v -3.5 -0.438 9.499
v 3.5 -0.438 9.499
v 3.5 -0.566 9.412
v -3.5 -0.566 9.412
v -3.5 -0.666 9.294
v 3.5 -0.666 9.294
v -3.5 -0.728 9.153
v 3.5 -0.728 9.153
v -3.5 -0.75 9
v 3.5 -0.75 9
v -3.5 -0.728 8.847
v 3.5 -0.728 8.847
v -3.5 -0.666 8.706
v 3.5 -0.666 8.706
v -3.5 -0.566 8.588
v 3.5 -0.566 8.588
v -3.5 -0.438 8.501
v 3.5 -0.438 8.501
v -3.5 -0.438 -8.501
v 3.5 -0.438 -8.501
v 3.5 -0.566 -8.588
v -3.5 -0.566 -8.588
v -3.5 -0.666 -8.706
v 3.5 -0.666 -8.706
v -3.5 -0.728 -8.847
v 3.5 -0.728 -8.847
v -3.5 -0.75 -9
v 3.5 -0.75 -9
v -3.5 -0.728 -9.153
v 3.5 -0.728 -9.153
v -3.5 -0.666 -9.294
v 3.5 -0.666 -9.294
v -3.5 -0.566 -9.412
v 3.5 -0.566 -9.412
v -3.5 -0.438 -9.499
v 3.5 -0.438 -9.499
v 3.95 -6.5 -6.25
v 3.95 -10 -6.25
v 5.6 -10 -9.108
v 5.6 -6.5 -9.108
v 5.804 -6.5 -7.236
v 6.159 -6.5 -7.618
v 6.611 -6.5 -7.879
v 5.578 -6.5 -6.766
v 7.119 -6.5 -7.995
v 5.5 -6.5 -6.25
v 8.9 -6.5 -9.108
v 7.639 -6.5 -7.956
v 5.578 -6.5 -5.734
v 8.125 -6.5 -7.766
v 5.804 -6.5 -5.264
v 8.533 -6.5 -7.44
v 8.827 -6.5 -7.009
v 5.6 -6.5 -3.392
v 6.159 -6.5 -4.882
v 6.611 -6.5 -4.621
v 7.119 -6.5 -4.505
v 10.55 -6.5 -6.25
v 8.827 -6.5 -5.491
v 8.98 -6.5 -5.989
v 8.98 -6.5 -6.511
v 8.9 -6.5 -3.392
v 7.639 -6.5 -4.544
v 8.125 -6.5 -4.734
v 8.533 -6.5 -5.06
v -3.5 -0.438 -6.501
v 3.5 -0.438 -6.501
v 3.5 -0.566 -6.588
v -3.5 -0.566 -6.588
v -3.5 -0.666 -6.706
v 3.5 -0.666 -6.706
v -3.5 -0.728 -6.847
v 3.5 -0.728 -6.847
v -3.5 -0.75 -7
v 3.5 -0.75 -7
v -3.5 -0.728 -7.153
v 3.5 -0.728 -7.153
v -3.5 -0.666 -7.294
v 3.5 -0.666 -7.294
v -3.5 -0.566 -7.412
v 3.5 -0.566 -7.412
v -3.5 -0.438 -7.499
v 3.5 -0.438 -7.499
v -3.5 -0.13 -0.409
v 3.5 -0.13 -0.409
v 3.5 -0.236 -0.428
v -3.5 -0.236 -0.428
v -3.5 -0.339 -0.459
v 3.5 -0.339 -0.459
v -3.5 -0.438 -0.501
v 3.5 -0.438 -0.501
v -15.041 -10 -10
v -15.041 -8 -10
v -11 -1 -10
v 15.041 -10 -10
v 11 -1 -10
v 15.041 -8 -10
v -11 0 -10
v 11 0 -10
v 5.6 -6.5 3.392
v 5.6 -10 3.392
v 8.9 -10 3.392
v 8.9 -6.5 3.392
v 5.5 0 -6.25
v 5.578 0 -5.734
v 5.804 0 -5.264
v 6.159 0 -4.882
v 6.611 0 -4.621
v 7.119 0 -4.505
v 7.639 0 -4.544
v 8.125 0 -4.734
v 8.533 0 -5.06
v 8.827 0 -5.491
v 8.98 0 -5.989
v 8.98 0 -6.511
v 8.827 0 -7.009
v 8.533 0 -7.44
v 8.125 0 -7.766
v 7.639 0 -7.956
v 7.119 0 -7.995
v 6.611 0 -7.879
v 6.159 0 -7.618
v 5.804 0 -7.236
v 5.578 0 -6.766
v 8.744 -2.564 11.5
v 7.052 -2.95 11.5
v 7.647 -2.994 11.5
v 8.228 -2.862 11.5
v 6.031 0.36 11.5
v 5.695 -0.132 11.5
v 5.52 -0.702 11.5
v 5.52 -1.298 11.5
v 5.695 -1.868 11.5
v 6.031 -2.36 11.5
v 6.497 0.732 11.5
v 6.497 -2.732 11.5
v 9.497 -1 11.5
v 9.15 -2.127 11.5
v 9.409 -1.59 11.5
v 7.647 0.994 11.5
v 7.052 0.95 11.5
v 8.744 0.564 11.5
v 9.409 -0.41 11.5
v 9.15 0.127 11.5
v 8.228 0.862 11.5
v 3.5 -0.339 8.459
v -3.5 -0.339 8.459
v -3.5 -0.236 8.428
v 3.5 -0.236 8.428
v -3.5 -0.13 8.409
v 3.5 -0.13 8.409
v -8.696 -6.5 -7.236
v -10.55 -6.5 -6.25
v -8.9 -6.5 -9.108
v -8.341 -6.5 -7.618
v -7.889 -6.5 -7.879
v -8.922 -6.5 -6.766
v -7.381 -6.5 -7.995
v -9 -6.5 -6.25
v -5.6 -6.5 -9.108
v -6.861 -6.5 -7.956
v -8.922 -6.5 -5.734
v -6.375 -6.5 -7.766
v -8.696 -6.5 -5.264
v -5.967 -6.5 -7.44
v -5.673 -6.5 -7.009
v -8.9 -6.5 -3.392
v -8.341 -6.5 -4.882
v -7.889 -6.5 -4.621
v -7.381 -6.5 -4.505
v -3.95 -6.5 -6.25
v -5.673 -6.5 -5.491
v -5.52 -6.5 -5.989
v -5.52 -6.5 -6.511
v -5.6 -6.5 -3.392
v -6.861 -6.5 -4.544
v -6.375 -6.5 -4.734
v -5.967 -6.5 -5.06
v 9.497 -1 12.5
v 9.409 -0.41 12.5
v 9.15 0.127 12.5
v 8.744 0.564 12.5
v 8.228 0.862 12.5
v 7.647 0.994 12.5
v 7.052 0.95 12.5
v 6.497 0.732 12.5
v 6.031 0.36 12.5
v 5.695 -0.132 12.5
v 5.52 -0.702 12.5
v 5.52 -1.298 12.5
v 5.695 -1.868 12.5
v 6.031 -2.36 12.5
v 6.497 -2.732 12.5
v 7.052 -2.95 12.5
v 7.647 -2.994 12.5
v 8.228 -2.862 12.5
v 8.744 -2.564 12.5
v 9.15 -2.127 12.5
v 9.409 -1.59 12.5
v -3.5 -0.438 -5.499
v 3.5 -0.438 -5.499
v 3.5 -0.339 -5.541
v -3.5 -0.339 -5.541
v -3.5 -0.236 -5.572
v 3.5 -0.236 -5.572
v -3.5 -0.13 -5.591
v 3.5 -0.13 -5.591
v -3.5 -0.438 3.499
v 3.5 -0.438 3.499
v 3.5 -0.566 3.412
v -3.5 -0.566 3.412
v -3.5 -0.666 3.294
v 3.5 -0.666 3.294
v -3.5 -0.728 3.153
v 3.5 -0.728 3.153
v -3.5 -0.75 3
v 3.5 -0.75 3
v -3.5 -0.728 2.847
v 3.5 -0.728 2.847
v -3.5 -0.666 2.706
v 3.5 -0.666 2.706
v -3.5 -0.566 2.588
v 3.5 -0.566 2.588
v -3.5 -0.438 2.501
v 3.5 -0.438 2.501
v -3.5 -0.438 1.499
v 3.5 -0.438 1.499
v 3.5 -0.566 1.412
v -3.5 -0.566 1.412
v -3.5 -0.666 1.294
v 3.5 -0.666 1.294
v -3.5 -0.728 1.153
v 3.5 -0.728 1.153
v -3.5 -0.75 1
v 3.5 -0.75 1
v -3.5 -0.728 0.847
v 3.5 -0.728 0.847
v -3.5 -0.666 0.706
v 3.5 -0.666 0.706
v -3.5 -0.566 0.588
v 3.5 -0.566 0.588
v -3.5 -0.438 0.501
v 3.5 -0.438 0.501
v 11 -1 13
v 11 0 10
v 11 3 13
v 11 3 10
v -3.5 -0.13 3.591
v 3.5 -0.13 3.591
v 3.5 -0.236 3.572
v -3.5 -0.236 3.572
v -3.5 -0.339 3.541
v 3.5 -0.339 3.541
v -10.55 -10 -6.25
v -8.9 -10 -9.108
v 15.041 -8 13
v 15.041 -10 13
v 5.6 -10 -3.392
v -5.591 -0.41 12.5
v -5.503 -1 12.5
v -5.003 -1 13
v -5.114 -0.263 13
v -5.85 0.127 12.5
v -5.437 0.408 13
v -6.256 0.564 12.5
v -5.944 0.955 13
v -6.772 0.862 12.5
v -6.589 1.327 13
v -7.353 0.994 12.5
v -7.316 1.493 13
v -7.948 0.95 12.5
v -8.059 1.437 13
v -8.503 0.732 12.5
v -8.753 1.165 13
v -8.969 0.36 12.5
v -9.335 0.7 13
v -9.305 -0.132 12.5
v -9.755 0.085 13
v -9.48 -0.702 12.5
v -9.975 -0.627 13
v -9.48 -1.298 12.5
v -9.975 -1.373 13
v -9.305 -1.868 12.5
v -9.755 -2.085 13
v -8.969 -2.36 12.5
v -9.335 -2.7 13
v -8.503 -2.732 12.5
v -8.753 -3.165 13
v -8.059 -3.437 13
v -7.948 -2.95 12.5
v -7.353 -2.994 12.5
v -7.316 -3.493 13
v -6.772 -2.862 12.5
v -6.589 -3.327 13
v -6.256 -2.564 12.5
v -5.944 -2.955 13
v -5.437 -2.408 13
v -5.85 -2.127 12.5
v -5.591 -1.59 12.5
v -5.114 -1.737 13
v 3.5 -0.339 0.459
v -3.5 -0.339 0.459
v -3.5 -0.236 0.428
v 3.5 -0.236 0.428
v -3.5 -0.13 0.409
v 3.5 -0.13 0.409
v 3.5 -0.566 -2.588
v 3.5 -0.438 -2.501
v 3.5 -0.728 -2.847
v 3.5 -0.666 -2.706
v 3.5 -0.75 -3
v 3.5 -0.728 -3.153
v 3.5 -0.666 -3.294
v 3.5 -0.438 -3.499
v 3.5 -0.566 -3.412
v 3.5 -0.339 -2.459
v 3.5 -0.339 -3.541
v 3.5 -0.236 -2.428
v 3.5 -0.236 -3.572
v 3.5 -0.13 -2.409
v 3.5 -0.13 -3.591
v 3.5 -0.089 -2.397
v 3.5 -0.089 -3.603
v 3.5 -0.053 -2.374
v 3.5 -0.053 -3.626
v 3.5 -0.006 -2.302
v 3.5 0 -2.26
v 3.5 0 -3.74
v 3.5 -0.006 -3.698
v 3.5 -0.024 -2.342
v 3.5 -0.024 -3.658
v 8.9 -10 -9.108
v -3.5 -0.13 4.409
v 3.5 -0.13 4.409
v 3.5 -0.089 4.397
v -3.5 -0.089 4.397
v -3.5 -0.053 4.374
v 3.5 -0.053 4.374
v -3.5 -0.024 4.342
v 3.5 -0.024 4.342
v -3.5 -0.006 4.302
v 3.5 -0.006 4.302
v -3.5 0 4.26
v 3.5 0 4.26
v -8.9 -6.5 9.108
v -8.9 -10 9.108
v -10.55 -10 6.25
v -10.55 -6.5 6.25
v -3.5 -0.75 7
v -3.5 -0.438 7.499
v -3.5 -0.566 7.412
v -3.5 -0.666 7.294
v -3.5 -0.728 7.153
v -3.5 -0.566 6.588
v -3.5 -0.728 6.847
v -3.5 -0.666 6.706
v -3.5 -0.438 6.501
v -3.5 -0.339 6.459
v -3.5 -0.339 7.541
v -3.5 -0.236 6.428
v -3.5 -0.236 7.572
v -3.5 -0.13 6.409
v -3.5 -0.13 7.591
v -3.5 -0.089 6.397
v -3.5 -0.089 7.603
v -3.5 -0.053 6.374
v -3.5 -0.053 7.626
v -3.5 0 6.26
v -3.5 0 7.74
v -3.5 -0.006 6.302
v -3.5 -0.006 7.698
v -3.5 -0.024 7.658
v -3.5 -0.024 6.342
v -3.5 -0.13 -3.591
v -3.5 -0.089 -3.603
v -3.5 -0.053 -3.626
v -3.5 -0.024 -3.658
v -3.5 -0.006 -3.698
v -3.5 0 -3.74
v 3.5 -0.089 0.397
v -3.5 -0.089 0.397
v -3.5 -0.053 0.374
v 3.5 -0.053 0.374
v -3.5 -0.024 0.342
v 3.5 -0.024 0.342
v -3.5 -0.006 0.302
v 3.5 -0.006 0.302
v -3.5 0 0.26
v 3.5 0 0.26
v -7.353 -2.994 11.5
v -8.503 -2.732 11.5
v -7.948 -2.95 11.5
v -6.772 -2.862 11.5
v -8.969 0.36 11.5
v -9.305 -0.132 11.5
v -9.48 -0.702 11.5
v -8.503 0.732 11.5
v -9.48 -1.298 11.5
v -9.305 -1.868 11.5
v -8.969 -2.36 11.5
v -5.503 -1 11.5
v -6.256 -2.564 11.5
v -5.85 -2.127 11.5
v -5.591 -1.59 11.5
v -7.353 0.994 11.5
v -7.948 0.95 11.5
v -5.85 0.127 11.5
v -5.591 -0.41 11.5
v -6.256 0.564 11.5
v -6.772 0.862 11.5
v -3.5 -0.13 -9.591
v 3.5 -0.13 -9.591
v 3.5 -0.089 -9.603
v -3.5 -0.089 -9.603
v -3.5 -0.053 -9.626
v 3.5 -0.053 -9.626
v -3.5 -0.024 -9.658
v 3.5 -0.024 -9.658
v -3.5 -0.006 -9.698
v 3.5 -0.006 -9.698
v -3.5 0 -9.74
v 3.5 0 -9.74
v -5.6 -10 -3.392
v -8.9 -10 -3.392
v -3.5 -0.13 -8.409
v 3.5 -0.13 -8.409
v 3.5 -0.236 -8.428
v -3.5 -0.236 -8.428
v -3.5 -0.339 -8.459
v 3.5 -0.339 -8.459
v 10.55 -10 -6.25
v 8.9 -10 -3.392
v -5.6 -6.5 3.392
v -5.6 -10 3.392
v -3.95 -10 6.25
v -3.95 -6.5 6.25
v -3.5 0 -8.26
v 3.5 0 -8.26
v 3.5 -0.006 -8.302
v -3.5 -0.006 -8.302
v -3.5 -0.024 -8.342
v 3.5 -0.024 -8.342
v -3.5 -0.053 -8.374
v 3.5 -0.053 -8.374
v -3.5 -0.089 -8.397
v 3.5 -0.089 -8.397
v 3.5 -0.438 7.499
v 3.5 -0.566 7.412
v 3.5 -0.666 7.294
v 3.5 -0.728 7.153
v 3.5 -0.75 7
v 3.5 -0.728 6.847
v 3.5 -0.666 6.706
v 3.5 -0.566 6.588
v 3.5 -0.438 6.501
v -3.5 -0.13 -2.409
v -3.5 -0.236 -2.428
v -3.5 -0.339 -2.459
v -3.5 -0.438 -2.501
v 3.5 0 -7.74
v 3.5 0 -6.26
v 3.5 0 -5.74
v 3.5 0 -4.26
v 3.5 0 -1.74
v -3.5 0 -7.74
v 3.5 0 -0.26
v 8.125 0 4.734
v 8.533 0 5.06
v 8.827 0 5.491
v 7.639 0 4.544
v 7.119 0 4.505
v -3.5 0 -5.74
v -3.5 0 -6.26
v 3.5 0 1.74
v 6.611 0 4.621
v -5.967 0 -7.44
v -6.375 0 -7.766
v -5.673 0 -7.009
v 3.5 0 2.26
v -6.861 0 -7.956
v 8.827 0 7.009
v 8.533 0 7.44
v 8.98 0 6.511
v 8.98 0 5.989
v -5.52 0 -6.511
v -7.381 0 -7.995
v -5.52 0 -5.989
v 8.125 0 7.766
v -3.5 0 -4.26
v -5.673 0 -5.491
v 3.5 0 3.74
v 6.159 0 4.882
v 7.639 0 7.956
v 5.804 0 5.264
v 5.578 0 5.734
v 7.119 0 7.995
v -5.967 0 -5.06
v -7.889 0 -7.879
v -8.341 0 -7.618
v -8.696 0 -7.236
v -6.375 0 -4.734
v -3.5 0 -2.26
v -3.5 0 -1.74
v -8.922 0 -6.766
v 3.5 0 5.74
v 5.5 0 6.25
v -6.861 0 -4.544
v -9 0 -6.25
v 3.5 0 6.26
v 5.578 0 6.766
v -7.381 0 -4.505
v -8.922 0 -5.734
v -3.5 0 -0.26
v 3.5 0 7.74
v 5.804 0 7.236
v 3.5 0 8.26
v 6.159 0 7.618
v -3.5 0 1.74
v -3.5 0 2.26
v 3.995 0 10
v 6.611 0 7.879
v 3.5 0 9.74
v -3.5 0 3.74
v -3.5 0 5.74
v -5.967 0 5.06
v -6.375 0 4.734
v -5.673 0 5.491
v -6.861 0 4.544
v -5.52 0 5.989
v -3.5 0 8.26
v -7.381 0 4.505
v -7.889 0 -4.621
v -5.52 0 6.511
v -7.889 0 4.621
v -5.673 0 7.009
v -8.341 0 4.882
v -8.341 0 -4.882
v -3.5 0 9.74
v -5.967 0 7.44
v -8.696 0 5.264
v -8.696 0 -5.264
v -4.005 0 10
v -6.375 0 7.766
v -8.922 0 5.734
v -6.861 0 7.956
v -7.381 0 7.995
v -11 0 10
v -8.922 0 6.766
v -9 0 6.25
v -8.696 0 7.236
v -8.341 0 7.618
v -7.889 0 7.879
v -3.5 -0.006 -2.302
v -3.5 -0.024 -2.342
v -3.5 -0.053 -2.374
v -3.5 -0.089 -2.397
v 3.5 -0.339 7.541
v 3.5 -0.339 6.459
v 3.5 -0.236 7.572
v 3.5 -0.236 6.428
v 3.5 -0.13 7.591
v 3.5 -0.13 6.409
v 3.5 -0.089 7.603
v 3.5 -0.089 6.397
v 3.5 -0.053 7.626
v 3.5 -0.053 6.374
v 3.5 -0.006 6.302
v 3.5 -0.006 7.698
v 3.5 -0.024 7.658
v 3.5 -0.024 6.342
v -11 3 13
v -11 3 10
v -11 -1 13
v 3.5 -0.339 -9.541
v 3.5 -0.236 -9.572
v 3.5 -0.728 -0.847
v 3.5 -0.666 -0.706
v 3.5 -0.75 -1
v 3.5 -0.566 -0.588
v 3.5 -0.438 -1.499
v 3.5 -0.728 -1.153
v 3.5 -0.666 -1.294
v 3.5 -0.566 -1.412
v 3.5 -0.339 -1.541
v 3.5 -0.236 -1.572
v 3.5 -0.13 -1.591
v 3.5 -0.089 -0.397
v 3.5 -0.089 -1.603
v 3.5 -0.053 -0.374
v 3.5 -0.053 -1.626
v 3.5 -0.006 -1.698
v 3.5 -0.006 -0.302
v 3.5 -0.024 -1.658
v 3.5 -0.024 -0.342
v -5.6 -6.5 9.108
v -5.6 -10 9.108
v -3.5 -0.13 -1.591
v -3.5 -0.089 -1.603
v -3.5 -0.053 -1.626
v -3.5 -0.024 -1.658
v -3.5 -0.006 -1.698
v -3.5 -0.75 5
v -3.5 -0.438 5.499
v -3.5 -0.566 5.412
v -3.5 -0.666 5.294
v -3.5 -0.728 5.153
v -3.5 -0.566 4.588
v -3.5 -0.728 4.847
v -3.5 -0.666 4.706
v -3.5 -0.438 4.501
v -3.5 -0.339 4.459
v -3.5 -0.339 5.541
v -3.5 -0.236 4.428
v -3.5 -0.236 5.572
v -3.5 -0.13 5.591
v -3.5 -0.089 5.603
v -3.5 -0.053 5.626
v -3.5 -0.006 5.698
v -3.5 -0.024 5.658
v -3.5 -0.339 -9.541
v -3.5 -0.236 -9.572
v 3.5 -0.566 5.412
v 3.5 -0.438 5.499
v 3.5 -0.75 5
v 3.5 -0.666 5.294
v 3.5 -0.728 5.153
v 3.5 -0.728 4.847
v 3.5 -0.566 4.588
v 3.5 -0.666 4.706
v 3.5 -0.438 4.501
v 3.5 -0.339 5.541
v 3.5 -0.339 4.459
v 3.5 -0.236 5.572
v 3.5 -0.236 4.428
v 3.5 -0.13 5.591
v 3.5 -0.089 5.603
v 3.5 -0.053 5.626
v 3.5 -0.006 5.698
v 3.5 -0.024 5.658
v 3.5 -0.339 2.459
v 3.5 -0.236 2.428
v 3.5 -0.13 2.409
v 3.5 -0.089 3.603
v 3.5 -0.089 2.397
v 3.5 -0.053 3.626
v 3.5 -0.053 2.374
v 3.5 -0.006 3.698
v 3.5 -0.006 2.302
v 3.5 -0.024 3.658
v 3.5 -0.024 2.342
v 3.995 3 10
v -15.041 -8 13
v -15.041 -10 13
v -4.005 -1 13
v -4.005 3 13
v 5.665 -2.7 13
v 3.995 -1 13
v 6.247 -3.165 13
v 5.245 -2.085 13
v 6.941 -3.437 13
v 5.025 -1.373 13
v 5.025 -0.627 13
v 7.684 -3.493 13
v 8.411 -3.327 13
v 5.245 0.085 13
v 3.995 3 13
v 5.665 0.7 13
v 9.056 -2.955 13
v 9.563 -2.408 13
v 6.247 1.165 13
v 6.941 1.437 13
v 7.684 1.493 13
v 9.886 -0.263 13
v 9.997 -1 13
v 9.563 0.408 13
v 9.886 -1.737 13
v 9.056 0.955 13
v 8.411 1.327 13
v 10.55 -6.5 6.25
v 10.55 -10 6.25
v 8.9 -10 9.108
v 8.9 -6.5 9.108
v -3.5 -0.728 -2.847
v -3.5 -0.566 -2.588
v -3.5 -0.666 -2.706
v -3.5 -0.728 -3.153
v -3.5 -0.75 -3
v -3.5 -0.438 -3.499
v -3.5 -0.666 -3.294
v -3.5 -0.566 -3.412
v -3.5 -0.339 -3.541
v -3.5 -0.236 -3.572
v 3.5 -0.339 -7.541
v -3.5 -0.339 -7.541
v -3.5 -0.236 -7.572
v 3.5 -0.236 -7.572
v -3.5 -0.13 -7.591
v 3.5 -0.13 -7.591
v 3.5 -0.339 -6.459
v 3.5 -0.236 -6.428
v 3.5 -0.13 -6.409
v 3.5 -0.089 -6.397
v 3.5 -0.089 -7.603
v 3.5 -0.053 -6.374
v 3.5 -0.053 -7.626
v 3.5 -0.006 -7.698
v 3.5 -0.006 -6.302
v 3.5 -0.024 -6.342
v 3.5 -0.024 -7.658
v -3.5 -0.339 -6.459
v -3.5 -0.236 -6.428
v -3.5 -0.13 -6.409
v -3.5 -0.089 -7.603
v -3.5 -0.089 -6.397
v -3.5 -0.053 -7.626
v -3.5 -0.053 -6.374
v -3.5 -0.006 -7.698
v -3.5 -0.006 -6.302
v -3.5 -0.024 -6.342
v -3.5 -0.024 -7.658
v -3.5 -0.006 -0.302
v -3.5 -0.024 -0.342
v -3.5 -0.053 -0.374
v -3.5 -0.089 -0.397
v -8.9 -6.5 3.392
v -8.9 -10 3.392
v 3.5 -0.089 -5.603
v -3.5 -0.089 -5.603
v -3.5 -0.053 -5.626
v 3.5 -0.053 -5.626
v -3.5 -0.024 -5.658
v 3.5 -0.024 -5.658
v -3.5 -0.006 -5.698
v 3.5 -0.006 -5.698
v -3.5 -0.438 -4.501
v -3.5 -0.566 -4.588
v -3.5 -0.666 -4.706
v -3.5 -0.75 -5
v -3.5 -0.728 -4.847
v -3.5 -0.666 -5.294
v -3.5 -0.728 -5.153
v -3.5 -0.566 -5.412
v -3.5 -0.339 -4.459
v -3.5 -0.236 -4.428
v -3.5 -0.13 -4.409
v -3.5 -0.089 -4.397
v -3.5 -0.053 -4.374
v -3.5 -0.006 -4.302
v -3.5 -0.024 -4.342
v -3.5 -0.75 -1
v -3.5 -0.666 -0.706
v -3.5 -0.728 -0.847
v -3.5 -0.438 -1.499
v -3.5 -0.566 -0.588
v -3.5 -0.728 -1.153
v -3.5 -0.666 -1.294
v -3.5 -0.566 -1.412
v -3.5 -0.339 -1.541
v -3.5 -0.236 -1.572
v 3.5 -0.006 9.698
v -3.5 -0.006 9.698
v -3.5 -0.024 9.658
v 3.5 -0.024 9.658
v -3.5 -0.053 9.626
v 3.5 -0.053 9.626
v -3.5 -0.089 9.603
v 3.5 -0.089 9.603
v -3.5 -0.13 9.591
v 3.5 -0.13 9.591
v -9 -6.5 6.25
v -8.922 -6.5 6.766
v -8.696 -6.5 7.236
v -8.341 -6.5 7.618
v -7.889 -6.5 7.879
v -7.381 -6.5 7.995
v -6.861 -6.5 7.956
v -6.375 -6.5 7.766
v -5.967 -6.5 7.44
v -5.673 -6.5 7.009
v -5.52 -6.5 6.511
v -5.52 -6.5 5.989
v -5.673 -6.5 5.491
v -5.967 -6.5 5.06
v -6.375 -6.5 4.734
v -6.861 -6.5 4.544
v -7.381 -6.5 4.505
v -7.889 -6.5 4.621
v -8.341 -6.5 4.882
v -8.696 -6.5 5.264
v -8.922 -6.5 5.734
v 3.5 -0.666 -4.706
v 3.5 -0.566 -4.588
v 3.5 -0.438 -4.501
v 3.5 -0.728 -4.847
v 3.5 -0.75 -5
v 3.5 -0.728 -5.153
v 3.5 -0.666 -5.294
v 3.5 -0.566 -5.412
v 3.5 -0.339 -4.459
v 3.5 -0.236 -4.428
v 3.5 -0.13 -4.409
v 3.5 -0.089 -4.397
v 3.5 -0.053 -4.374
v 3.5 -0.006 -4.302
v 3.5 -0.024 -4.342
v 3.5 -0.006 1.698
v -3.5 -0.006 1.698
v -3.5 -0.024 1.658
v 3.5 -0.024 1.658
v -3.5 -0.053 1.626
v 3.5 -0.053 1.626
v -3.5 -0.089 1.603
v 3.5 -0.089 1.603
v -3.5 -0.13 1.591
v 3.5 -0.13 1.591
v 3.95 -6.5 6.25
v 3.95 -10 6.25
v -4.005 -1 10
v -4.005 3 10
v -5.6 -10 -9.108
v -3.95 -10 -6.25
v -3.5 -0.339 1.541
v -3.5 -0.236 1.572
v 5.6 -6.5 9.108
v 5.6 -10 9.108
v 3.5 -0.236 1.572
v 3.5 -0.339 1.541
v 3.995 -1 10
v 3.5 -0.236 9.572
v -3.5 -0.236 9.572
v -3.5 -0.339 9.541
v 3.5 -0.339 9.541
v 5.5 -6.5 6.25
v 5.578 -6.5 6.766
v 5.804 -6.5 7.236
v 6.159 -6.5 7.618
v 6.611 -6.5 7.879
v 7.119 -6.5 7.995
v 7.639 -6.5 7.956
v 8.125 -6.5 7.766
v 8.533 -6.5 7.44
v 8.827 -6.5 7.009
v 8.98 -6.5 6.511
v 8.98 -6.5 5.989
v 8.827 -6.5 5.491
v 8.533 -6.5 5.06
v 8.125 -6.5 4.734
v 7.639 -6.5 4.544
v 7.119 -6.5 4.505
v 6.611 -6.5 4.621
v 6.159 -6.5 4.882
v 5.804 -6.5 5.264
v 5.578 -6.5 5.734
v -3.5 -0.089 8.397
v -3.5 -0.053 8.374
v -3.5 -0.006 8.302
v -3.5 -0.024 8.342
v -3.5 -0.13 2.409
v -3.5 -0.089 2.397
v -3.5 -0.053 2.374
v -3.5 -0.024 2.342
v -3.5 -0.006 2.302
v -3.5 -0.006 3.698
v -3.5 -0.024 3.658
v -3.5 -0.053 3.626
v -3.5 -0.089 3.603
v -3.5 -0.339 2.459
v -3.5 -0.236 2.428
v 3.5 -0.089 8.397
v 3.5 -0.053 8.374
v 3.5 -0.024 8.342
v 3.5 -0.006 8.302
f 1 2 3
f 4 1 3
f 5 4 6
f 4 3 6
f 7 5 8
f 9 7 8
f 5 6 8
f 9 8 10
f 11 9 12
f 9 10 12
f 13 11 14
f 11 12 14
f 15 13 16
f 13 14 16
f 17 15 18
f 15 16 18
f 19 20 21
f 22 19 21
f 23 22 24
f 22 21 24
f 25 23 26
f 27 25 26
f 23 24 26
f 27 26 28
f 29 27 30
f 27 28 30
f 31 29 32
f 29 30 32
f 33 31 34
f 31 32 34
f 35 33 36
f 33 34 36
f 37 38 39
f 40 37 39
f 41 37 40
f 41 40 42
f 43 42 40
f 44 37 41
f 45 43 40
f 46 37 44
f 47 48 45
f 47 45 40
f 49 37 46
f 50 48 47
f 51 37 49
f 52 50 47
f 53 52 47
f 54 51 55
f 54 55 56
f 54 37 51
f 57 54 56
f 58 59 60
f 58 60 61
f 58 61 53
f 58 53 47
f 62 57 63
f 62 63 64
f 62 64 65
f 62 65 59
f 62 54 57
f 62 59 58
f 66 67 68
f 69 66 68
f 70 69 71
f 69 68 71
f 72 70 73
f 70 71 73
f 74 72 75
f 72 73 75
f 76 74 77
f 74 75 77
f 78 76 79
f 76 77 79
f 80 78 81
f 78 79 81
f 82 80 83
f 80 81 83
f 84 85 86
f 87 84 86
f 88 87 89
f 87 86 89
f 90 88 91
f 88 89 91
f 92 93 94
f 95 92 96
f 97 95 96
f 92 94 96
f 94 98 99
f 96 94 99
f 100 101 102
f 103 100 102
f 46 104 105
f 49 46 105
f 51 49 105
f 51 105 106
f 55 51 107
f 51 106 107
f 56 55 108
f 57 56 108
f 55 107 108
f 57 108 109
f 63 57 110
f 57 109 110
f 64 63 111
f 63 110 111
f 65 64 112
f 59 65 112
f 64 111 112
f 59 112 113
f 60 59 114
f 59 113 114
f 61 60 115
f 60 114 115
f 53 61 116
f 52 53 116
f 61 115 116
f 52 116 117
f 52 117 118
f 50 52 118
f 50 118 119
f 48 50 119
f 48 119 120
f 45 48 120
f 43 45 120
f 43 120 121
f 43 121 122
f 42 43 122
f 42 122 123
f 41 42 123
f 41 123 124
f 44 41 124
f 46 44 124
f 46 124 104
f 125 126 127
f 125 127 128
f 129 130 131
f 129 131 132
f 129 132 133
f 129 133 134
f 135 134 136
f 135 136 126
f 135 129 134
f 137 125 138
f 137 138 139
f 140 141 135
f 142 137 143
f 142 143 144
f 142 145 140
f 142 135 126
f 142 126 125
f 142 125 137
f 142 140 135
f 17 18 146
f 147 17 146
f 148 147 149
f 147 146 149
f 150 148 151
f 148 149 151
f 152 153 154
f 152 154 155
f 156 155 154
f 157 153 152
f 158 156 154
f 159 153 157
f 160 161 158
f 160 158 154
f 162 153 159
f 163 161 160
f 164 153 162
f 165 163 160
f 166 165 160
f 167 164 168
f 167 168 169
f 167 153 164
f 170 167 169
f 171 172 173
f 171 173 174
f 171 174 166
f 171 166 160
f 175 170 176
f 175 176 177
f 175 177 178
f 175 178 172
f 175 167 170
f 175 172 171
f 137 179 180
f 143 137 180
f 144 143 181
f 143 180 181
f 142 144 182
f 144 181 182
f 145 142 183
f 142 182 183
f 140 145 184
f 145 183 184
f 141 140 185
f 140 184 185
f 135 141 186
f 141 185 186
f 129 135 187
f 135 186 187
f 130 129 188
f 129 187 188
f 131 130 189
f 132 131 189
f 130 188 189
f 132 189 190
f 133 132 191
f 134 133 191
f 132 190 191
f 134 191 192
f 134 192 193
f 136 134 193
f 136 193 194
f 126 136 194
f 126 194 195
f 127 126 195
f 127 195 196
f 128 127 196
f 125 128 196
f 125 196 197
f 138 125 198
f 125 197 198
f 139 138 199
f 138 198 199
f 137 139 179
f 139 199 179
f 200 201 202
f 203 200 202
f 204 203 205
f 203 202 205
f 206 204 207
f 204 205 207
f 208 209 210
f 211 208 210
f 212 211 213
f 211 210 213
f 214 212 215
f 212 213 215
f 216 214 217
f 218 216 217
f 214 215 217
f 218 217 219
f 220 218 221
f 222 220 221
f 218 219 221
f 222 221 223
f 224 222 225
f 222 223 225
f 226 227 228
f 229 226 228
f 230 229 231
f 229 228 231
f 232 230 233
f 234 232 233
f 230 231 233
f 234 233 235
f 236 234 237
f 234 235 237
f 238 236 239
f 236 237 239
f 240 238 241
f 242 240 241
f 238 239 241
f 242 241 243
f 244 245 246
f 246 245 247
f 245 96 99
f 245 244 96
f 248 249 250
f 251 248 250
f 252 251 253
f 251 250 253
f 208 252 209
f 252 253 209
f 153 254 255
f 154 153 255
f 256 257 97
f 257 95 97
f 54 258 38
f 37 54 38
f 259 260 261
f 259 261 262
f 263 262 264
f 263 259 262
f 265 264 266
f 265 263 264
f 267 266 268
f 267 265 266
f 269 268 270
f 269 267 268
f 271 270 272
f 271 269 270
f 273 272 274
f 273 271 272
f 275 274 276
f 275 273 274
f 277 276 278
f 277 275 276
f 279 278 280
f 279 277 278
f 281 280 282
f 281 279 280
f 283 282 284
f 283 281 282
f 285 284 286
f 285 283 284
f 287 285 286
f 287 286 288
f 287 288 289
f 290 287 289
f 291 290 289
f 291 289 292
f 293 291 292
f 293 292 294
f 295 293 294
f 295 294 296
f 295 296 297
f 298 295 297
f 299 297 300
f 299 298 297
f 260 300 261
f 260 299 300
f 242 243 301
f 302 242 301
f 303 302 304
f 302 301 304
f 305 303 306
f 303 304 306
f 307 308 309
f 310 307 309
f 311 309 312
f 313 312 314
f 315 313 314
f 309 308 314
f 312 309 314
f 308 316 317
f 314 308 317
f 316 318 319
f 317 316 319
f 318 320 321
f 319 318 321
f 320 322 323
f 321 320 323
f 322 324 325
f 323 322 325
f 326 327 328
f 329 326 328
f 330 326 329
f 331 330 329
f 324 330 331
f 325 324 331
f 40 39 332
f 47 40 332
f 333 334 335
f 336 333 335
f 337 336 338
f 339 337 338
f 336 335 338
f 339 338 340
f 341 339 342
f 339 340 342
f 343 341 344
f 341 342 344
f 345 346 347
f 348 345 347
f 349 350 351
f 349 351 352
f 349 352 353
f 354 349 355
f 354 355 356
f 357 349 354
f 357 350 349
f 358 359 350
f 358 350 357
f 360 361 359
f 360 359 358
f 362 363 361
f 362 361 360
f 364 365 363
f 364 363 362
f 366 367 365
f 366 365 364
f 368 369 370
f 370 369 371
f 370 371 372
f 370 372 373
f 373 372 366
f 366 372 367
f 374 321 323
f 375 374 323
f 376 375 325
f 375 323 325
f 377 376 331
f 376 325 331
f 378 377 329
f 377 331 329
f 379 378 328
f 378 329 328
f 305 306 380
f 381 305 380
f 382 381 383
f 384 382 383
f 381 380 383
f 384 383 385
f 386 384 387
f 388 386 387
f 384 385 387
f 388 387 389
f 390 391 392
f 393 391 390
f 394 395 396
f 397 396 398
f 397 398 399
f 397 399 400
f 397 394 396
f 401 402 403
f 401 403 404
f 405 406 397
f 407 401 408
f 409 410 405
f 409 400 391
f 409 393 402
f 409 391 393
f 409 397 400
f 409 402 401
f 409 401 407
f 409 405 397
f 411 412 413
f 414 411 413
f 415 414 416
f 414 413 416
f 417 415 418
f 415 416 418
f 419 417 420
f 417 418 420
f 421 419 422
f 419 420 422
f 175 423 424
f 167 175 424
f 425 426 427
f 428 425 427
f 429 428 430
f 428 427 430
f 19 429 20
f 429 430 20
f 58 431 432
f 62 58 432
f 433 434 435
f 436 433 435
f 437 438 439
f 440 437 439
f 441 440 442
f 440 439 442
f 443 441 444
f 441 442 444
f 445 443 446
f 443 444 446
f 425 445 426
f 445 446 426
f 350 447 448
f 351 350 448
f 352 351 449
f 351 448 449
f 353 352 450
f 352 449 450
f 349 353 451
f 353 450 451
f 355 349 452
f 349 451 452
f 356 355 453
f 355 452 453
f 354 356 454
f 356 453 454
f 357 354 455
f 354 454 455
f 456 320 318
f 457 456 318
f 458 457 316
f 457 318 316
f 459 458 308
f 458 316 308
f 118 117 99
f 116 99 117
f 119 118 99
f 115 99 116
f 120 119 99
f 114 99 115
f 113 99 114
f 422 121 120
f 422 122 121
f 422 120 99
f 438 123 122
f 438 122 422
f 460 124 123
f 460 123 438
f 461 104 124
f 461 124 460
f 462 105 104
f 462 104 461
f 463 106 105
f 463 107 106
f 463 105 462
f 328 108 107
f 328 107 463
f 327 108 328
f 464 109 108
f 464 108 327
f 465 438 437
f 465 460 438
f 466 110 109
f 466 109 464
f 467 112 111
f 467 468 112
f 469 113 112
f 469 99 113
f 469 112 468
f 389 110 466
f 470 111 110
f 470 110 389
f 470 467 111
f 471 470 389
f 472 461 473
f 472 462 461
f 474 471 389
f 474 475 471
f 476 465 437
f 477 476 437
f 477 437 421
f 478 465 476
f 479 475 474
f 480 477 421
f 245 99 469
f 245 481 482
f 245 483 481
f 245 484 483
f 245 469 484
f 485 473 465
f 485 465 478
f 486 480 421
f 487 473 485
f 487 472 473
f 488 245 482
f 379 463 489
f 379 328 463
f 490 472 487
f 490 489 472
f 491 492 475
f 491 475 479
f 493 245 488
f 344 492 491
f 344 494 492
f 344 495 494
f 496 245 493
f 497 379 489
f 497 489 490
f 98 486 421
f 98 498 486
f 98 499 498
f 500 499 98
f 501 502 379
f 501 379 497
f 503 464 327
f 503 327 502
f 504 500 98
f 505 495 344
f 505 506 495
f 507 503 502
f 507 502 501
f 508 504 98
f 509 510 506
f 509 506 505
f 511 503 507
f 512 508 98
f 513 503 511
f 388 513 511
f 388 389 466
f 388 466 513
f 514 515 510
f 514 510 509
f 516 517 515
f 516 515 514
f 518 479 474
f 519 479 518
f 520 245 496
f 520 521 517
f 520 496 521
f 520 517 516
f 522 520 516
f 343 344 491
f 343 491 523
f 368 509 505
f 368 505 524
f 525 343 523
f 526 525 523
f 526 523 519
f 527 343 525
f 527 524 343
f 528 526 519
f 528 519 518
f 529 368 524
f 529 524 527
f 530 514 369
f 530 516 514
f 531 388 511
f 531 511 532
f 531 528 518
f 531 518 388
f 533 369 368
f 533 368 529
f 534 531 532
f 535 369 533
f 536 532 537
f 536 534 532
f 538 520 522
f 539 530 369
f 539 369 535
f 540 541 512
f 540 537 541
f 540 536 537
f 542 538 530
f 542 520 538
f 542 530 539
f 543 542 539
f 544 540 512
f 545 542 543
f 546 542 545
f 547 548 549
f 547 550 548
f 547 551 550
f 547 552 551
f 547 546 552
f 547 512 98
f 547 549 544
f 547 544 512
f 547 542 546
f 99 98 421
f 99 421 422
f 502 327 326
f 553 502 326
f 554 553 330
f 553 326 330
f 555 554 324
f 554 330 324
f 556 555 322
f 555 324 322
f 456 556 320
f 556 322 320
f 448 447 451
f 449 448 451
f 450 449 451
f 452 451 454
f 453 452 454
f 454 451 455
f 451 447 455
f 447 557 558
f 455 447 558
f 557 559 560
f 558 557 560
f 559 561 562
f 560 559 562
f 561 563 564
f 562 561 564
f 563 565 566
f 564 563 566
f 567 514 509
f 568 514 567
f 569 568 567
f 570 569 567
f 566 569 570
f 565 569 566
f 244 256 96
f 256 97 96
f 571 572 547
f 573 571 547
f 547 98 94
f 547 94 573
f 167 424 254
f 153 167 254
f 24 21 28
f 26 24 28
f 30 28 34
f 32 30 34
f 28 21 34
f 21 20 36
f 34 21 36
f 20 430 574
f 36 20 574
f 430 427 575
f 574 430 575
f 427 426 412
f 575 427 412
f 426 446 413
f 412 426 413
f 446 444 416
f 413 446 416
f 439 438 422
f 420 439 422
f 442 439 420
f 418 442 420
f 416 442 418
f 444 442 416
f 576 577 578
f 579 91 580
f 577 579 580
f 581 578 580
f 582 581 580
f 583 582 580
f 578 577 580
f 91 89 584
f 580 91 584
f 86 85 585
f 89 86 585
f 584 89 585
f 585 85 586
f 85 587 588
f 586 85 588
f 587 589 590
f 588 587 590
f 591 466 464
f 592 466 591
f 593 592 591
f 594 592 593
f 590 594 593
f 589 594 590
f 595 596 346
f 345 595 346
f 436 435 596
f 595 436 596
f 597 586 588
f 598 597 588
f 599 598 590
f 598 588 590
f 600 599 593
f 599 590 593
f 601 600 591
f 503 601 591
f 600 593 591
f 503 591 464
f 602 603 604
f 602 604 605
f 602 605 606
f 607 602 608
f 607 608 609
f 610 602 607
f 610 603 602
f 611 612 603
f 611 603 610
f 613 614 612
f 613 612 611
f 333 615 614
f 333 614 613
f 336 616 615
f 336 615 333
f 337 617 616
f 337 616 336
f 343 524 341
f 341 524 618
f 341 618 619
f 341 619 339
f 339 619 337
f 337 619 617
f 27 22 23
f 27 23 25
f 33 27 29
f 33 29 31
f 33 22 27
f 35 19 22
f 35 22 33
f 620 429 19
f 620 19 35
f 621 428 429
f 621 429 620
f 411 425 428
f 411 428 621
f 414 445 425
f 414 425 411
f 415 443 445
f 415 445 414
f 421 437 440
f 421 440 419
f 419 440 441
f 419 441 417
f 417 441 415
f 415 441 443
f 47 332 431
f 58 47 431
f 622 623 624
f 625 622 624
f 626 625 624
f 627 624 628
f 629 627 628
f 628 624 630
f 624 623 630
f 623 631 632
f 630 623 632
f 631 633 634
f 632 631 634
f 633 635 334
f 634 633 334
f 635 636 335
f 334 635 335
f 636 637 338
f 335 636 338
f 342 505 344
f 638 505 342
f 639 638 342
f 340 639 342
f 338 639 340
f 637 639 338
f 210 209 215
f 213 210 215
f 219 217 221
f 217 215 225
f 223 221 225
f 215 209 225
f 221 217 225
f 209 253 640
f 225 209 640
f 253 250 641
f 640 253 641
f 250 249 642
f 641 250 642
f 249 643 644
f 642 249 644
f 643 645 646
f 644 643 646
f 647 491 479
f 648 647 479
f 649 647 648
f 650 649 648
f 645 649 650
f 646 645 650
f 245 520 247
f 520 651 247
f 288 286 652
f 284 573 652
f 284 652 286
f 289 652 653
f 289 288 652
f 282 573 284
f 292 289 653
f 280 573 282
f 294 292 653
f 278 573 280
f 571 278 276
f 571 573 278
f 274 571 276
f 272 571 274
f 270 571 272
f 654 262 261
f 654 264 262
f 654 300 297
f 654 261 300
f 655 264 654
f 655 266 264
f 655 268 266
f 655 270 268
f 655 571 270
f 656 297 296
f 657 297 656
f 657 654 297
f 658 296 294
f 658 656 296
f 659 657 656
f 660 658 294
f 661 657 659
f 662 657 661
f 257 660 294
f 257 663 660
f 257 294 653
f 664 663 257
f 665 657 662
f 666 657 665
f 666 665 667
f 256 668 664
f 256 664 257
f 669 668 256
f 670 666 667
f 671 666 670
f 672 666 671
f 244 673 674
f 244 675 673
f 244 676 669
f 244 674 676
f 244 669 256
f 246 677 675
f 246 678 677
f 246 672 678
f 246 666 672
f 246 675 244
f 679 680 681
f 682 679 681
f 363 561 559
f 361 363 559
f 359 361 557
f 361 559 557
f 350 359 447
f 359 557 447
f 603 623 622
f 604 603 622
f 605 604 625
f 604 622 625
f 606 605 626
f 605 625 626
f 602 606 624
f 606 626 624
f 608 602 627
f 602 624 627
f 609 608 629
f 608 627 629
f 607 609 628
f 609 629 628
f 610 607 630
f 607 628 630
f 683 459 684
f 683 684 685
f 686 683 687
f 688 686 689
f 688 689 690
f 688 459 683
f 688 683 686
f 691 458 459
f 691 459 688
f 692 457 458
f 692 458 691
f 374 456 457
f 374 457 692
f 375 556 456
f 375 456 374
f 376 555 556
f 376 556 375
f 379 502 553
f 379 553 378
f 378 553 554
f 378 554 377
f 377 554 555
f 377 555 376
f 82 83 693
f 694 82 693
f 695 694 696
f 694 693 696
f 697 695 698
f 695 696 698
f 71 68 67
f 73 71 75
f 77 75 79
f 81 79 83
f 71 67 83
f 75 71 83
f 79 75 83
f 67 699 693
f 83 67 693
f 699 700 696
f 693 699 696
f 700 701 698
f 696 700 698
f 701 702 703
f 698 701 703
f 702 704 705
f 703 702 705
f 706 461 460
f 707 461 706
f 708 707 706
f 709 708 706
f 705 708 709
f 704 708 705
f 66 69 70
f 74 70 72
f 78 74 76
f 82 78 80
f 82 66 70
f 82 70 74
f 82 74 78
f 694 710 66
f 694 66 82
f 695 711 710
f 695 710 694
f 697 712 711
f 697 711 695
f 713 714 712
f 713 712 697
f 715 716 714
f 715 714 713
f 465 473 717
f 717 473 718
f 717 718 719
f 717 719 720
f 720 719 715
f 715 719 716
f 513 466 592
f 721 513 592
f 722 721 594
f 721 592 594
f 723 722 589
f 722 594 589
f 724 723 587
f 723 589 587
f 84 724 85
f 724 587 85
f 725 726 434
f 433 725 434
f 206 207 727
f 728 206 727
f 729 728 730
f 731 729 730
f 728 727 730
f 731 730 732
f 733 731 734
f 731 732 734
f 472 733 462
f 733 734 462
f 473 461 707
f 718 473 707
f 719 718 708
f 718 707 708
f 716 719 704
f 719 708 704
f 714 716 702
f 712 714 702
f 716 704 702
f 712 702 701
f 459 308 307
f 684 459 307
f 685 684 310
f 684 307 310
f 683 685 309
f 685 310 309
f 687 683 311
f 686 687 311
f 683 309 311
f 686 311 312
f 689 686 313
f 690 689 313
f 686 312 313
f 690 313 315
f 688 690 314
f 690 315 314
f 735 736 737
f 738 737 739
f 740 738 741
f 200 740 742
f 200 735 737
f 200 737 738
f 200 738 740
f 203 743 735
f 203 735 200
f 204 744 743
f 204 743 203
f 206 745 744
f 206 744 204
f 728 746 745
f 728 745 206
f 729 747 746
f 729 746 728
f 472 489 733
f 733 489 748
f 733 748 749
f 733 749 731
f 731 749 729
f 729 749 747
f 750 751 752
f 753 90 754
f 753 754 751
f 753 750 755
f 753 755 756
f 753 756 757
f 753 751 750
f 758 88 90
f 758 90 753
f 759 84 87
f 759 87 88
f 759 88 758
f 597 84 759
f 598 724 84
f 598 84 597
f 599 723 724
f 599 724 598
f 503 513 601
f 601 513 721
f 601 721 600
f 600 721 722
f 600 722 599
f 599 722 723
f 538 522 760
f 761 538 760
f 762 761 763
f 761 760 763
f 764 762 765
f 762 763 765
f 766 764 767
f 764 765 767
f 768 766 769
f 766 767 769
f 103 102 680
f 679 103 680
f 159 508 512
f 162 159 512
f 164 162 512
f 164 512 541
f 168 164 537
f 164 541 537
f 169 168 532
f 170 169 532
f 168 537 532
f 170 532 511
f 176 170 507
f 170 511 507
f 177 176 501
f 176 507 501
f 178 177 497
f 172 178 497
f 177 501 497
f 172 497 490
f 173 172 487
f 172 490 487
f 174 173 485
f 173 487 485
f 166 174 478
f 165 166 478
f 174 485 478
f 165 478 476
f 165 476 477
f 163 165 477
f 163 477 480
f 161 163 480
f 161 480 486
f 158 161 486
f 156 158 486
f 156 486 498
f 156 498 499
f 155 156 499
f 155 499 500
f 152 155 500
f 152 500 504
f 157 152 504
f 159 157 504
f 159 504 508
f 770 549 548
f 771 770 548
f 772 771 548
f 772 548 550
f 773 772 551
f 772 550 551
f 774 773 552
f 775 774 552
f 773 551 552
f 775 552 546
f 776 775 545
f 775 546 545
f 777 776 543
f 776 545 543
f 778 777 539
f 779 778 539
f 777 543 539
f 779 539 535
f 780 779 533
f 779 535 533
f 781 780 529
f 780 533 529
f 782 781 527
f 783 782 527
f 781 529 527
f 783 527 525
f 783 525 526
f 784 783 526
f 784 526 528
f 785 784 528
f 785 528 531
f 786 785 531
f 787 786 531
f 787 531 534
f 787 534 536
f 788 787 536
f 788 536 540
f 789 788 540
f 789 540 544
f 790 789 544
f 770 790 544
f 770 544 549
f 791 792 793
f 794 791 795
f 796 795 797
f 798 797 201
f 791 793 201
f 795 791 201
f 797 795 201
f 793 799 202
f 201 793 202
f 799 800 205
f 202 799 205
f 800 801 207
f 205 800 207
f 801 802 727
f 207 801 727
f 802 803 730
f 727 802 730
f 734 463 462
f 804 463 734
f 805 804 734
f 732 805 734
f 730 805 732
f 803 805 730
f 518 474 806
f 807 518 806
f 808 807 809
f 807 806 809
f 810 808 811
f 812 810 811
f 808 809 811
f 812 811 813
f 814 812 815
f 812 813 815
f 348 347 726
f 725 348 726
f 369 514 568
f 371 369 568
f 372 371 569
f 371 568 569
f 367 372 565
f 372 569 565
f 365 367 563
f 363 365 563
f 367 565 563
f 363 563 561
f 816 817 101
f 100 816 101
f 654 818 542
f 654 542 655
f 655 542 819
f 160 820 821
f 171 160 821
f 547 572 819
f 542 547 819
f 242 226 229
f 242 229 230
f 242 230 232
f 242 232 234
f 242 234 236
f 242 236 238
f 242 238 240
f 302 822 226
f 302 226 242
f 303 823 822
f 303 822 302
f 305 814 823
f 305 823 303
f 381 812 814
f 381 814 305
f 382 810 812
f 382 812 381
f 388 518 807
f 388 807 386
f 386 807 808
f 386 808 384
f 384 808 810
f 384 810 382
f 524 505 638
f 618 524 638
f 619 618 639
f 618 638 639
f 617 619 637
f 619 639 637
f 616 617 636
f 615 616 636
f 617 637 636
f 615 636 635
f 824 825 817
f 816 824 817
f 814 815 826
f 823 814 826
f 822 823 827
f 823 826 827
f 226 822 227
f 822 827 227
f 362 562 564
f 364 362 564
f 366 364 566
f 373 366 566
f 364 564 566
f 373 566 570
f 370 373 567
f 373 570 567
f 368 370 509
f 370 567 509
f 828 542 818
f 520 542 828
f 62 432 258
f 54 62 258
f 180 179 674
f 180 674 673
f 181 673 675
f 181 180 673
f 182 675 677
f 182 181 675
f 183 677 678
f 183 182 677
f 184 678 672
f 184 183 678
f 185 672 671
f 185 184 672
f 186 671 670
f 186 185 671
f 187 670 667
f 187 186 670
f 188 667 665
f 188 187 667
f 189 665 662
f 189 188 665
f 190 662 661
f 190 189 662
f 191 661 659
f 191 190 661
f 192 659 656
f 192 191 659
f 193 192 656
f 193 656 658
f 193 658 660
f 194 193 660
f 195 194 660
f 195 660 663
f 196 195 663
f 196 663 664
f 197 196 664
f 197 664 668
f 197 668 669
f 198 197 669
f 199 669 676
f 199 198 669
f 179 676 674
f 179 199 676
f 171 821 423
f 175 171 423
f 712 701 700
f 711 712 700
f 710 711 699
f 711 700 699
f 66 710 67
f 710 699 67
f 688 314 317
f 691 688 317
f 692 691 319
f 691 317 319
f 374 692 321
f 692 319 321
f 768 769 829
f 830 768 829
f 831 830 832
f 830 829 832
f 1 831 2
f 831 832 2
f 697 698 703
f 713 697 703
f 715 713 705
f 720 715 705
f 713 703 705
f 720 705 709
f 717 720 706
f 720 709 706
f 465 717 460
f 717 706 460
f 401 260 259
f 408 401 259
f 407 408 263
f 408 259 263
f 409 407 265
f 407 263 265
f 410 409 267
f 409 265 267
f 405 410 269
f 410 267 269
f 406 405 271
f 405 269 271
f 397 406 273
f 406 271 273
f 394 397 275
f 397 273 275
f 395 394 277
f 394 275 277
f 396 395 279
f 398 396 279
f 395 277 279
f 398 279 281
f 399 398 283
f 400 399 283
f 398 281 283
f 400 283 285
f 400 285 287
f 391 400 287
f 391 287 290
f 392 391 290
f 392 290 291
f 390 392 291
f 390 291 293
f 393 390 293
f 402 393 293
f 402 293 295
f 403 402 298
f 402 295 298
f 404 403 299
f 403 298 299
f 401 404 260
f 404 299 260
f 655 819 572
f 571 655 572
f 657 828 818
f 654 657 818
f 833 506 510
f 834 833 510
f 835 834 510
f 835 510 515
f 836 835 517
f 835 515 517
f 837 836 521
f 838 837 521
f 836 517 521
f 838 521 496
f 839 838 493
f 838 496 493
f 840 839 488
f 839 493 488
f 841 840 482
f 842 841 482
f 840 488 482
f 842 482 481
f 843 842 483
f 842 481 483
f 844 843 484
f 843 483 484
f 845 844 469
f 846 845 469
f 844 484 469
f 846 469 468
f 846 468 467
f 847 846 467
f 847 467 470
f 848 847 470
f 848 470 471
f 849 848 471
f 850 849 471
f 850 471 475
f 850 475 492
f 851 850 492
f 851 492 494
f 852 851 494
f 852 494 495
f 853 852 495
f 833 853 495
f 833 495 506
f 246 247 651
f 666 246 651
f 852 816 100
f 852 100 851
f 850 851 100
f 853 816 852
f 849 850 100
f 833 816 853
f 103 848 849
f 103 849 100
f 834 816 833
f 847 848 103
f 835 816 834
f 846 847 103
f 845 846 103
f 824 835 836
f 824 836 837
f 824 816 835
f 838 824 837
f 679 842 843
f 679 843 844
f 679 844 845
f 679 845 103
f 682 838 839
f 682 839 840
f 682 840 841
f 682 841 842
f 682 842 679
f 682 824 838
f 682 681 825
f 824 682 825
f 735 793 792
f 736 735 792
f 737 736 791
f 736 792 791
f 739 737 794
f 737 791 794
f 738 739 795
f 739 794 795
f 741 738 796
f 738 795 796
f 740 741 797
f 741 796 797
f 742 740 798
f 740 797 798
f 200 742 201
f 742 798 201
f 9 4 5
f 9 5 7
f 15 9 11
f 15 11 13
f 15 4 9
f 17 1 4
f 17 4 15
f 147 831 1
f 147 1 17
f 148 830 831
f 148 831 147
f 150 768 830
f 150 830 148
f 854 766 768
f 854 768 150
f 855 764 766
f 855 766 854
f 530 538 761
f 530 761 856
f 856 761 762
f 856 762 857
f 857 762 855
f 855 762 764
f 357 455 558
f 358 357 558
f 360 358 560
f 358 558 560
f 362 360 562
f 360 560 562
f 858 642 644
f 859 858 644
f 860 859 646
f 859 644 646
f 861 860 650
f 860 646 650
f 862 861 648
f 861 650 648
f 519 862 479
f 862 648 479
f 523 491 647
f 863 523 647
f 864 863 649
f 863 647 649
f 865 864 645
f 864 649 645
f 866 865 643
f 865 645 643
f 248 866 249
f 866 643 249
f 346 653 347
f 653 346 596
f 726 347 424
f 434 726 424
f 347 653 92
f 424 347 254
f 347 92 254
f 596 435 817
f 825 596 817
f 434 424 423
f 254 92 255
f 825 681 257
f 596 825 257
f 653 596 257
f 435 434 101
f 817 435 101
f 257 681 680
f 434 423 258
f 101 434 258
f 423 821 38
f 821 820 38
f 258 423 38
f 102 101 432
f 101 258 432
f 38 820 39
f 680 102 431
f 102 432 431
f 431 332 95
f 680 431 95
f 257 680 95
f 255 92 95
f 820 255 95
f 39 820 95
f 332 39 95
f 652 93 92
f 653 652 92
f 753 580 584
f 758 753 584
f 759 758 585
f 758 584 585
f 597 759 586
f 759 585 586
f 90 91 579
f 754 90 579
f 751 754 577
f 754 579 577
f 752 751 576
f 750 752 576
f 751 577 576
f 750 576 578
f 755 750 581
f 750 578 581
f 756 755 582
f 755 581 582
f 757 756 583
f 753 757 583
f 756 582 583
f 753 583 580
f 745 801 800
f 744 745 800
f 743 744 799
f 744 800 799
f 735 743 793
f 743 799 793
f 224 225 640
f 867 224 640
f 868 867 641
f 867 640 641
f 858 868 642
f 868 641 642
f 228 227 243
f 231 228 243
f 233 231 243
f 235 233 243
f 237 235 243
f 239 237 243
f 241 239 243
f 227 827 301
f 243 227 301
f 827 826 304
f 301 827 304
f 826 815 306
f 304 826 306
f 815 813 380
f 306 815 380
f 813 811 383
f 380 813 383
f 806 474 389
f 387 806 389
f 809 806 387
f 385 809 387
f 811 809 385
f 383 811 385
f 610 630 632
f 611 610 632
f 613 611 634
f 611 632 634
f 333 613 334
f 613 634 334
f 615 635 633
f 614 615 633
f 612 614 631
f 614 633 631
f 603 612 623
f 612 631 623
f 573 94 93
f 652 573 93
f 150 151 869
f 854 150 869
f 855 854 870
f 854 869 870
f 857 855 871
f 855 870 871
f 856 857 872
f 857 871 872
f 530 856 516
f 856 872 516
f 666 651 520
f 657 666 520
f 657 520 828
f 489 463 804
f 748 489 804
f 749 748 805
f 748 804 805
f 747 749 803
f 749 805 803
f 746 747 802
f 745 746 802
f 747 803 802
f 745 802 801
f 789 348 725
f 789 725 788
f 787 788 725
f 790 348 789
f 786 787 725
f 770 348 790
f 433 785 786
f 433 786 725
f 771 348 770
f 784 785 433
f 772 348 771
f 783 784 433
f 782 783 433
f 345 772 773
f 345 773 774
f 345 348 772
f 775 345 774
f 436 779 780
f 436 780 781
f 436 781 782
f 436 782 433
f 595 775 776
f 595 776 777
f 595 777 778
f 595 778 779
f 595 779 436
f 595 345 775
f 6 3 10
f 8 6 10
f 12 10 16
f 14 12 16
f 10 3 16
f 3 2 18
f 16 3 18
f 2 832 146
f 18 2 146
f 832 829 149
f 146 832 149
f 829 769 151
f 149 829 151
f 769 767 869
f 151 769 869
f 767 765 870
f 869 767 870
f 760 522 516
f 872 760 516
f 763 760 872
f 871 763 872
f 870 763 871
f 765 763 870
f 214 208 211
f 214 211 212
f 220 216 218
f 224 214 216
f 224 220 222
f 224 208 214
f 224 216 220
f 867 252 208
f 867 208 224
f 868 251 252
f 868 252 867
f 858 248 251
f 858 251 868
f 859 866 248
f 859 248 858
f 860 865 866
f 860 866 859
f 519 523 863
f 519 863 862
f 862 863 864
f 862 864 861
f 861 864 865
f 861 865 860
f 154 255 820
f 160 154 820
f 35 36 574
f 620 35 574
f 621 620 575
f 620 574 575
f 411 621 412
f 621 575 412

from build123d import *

# Parameters (mm, degrees)
ESTRUSIONE_ESTRUSIONE1_DEPTH = 10
TAGLIO_ESTRUSIONE6_DEPTH     = 3.5
SCHIZZO3_R                   = 1.75
TAGLIO_ESTRUSIONE7_DEPTH     = 21.645708387
ESTRUSIONE_ESTRUSIONE2_DEPTH = 3
SCHIZZO5_R                   = 2
TAGLIO_ESTRUSIONE8_DEPTH     = 1.5
SMUSSO2_SIZE                 = 0.5
TAGLIO_ESTRUSIONE9_DEPTH     = 3.5


with BuildPart() as part:
    # Schizzo1 → Estrusione-Estrusione1 (new, symmetric)
    with BuildSketch(Plane.XY):
        Polygon((11, -1), (11, 0), (-11, 0), (-11, -1), (-15.041451884, -8), (-15.041451884, -10), (15.041451884, -10), (15.041451884, -8), align=None)
    extrude(amount=ESTRUSIONE_ESTRUSIONE1_DEPTH, both=True)

    # Schizzo2 → Taglio-Estrusione6 (cut, symmetric)
    with BuildSketch(Plane(origin=(0, 0, 0), x_dir=(0, 0, -1), z_dir=(1, 0, 0))):
        with BuildLine():
            Line((-10, 0), (-9.740175425, 0))
            ThreePointArc((-9.740175425, 0), (-9.641268354, -0.037228588), (-9.591456891, -0.130434783))
            ThreePointArc((-9.591456891, -0.130434783), (-9.557611714, -0.288062154), (-9.498876404, -0.438202247))
            ThreePointArc((-9.498876404, -0.438202247), (-9, -0.75), (-8.501123596, -0.438202247))
            ThreePointArc((-8.501123596, -0.438202247), (-8.442388286, -0.288062154), (-8.408543109, -0.130434783))
            ThreePointArc((-8.408543109, -0.130434783), (-8.358731646, -0.037228588), (-8.259824575, 0))
            Line((-8.259824575, 0), (-8, 0))
            Line((-8, 0), (-7.740175425, 0))
            ThreePointArc((-7.740175425, 0), (-7.641268354, -0.037228588), (-7.591456891, -0.130434783))
            ThreePointArc((-7.591456891, -0.130434783), (-7.557611714, -0.288062154), (-7.498876404, -0.438202247))
            ThreePointArc((-7.498876404, -0.438202247), (-7, -0.75), (-6.501123596, -0.438202247))
            ThreePointArc((-6.501123596, -0.438202247), (-6.442388286, -0.288062154), (-6.408543109, -0.130434783))
            ThreePointArc((-6.408543109, -0.130434783), (-6.358731646, -0.037228588), (-6.259824575, 0))
            Line((-6.259824575, 0), (-6, 0))
            Line((-6, 0), (-5.740175425, 0))
            ThreePointArc((-5.740175425, 0), (-5.641268354, -0.037228588), (-5.591456891, -0.130434783))
            ThreePointArc((-5.591456891, -0.130434783), (-5.557611714, -0.288062154), (-5.498876404, -0.438202247))
            ThreePointArc((-5.498876404, -0.438202247), (-5, -0.75), (-4.501123596, -0.438202247))
            ThreePointArc((-4.501123596, -0.438202247), (-4.442388286, -0.288062154), (-4.408543109, -0.130434783))
            ThreePointArc((-4.408543109, -0.130434783), (-4.358731646, -0.037228588), (-4.259824575, 0))
            Line((-4.259824575, 0), (-4, 0))
            Line((-4, 0), (-3.740175425, 0))
            ThreePointArc((-3.740175425, 0), (-3.641268354, -0.037228588), (-3.591456891, -0.130434783))
            ThreePointArc((-3.591456891, -0.130434783), (-3.557611714, -0.288062154), (-3.498876404, -0.438202247))
            ThreePointArc((-3.498876404, -0.438202247), (-3, -0.75), (-2.501123596, -0.438202247))
            ThreePointArc((-2.501123596, -0.438202247), (-2.442388286, -0.288062154), (-2.408543109, -0.130434783))
            ThreePointArc((-2.408543109, -0.130434783), (-2.358731646, -0.037228588), (-2.259824575, 0))
            Line((-2.259824575, 0), (-2, 0))
            Line((-2, 0), (-1.740175425, 0))
            ThreePointArc((-1.740175425, 0), (-1.641268354, -0.037228588), (-1.591456891, -0.130434783))
            ThreePointArc((-1.591456891, -0.130434783), (-1.557611714, -0.288062154), (-1.498876404, -0.438202247))
            ThreePointArc((-1.498876404, -0.438202247), (-1, -0.75), (-0.501123596, -0.438202247))
            ThreePointArc((-0.501123596, -0.438202247), (-0.442388286, -0.288062154), (-0.408543109, -0.130434783))
            ThreePointArc((-0.408543109, -0.130434783), (-0.358731646, -0.037228588), (-0.259824575, 0))
            Line((-0.259824575, 0), (0, 0))
            Line((0, 0), (0.259824575, 0))
            ThreePointArc((0.259824575, 0), (0.358731646, -0.037228588), (0.408543109, -0.130434783))
            ThreePointArc((0.408543109, -0.130434783), (0.442388286, -0.288062154), (0.501123596, -0.438202247))
            ThreePointArc((0.501123596, -0.438202247), (1, -0.75), (1.498876404, -0.438202247))
            ThreePointArc((1.498876404, -0.438202247), (1.557611714, -0.288062154), (1.591456891, -0.130434783))
            ThreePointArc((1.591456891, -0.130434783), (1.641268354, -0.037228588), (1.740175425, 0))
            Line((1.740175425, 0), (2, 0))
            Line((2, 0), (2.259824575, 0))
            ThreePointArc((2.259824575, 0), (2.358731646, -0.037228588), (2.408543109, -0.130434783))
            ThreePointArc((2.408543109, -0.130434783), (2.442388286, -0.288062154), (2.501123596, -0.438202247))
            ThreePointArc((2.501123596, -0.438202247), (3, -0.75), (3.498876404, -0.438202247))
            ThreePointArc((3.498876404, -0.438202247), (3.557611714, -0.288062154), (3.591456891, -0.130434783))
            ThreePointArc((3.591456891, -0.130434783), (3.641268354, -0.037228588), (3.740175425, 0))
            Line((3.740175425, 0), (4, 0))
            Line((4, 0), (4.259824575, 0))
            ThreePointArc((4.259824575, 0), (4.358731646, -0.037228588), (4.408543109, -0.130434783))
            ThreePointArc((4.408543109, -0.130434783), (4.442388286, -0.288062154), (4.501123596, -0.438202247))
            ThreePointArc((4.501123596, -0.438202247), (5, -0.75), (5.498876404, -0.438202247))
            ThreePointArc((5.498876404, -0.438202247), (5.557611714, -0.288062154), (5.591456891, -0.130434783))
            ThreePointArc((5.591456891, -0.130434783), (5.641268354, -0.037228588), (5.740175425, 0))
            Line((5.740175425, 0), (6, 0))
            Line((6, 0), (6.259824575, 0))
            ThreePointArc((6.259824575, 0), (6.358731646, -0.037228588), (6.408543109, -0.130434783))
            ThreePointArc((6.408543109, -0.130434783), (6.442388286, -0.288062154), (6.501123596, -0.438202247))
            ThreePointArc((6.501123596, -0.438202247), (7, -0.75), (7.498876404, -0.438202247))
            ThreePointArc((7.498876404, -0.438202247), (7.557611714, -0.288062154), (7.591456891, -0.130434783))
            ThreePointArc((7.591456891, -0.130434783), (7.641268354, -0.037228588), (7.740175425, 0))
            Line((7.740175425, 0), (8, 0))
            Line((8, 0), (8.259824575, 0))
            ThreePointArc((8.259824575, 0), (8.358731646, -0.037228588), (8.408543109, -0.130434783))
            ThreePointArc((8.408543109, -0.130434783), (8.442388286, -0.288062154), (8.501123596, -0.438202247))
            ThreePointArc((8.501123596, -0.438202247), (9, -0.75), (9.498876404, -0.438202247))
            ThreePointArc((9.498876404, -0.438202247), (9.557611714, -0.288062154), (9.591456891, -0.130434783))
            ThreePointArc((9.591456891, -0.130434783), (9.641268354, -0.037228588), (9.740175425, 0))
            Line((9.740175425, 0), (10, 0))
            Line((10, 0), (10, 1.47712545))
            Line((10, 1.47712545), (-10, 1.47712545))
            Line((-10, 1.47712545), (-10, 0))
        make_face()
    extrude(amount=TAGLIO_ESTRUSIONE6_DEPTH, both=True, mode=Mode.SUBTRACT)

    # Schizzo3 → Taglio-Estrusione7 (cut, through all)
    with BuildSketch(Plane(origin=(0, 0, 0), x_dir=(1, 0, 0), z_dir=(0, 1, 0))):
        with Locations(Location((7.25, 6.25, 0), (0, 0, 180))):
            Circle(SCHIZZO3_R)
        with Locations(Location((7.25, -6.25, 0), (0, 0, 180))):
            Circle(SCHIZZO3_R)
        with Locations(Location((-7.25, -6.25, 0), (0, 0, 180))):
            Circle(SCHIZZO3_R)
        with Locations(Location((-7.25, 6.25, 0), (0, 0, 180))):
            Circle(SCHIZZO3_R)
    extrude(amount=-TAGLIO_ESTRUSIONE7_DEPTH, mode=Mode.SUBTRACT)

    # Schizzo4 → Estrusione-Estrusione2 (add)
    with BuildSketch(Plane.XY.offset(10)):
        Polygon((-15.041451884, -10), (15.041451884, -10), (15.041451884, -8), (11, -1), (11, 3), (3.994785695, 3), (3.994785695, -1), (-4.005214305, -1), (-4.005214305, 3), (-11, 3), (-11, -1), (-15.041451884, -8), align=None)
    extrude(amount=ESTRUSIONE_ESTRUSIONE2_DEPTH)

    # Schizzo5 → Taglio-Estrusione8 (cut)
    with BuildSketch(Plane.XY.offset(13)):
        with Locations((7.497392847, -1)):
            Circle(SCHIZZO5_R)
        with Locations((-7.502607153, -1)):
            Circle(SCHIZZO5_R)
    extrude(amount=-TAGLIO_ESTRUSIONE8_DEPTH, mode=Mode.SUBTRACT)

    # Smusso2
    smusso2_edges = [part.edges().sort_by_distance(p)[0] for p in [
        (5.497392847, -1, 13),
        (-9.502607153, -1, 13),
    ]]
    chamfer(smusso2_edges, length=SMUSSO2_SIZE)

    # Schizzo6 → Taglio-Estrusione9 (cut)
    with BuildSketch(Plane.XZ.offset(10)):
        Polygon((-8.9, 9.107883832), (-10.55, 6.25), (-8.9, 3.392116168), (-5.6, 3.392116168), (-3.95, 6.25), (-5.6, 9.107883832), align=None)
        Polygon((-5.6, -3.392116168), (-8.9, -3.392116168), (-10.55, -6.25), (-8.9, -9.107883832), (-5.6, -9.107883832), (-3.95, -6.25), align=None)
        Polygon((10.55, -6.25), (8.9, -3.392116168), (5.6, -3.392116168), (3.95, -6.25), (5.6, -9.107883832), (8.9, -9.107883832), align=None)
        Polygon((5.6, 3.392116168), (8.9, 3.392116168), (10.55, 6.25), (8.9, 9.107883832), (5.6, 9.107883832), (3.95, 6.25), align=None)
    extrude(amount=-TAGLIO_ESTRUSIONE9_DEPTH, mode=Mode.SUBTRACT)


solid = part.part
